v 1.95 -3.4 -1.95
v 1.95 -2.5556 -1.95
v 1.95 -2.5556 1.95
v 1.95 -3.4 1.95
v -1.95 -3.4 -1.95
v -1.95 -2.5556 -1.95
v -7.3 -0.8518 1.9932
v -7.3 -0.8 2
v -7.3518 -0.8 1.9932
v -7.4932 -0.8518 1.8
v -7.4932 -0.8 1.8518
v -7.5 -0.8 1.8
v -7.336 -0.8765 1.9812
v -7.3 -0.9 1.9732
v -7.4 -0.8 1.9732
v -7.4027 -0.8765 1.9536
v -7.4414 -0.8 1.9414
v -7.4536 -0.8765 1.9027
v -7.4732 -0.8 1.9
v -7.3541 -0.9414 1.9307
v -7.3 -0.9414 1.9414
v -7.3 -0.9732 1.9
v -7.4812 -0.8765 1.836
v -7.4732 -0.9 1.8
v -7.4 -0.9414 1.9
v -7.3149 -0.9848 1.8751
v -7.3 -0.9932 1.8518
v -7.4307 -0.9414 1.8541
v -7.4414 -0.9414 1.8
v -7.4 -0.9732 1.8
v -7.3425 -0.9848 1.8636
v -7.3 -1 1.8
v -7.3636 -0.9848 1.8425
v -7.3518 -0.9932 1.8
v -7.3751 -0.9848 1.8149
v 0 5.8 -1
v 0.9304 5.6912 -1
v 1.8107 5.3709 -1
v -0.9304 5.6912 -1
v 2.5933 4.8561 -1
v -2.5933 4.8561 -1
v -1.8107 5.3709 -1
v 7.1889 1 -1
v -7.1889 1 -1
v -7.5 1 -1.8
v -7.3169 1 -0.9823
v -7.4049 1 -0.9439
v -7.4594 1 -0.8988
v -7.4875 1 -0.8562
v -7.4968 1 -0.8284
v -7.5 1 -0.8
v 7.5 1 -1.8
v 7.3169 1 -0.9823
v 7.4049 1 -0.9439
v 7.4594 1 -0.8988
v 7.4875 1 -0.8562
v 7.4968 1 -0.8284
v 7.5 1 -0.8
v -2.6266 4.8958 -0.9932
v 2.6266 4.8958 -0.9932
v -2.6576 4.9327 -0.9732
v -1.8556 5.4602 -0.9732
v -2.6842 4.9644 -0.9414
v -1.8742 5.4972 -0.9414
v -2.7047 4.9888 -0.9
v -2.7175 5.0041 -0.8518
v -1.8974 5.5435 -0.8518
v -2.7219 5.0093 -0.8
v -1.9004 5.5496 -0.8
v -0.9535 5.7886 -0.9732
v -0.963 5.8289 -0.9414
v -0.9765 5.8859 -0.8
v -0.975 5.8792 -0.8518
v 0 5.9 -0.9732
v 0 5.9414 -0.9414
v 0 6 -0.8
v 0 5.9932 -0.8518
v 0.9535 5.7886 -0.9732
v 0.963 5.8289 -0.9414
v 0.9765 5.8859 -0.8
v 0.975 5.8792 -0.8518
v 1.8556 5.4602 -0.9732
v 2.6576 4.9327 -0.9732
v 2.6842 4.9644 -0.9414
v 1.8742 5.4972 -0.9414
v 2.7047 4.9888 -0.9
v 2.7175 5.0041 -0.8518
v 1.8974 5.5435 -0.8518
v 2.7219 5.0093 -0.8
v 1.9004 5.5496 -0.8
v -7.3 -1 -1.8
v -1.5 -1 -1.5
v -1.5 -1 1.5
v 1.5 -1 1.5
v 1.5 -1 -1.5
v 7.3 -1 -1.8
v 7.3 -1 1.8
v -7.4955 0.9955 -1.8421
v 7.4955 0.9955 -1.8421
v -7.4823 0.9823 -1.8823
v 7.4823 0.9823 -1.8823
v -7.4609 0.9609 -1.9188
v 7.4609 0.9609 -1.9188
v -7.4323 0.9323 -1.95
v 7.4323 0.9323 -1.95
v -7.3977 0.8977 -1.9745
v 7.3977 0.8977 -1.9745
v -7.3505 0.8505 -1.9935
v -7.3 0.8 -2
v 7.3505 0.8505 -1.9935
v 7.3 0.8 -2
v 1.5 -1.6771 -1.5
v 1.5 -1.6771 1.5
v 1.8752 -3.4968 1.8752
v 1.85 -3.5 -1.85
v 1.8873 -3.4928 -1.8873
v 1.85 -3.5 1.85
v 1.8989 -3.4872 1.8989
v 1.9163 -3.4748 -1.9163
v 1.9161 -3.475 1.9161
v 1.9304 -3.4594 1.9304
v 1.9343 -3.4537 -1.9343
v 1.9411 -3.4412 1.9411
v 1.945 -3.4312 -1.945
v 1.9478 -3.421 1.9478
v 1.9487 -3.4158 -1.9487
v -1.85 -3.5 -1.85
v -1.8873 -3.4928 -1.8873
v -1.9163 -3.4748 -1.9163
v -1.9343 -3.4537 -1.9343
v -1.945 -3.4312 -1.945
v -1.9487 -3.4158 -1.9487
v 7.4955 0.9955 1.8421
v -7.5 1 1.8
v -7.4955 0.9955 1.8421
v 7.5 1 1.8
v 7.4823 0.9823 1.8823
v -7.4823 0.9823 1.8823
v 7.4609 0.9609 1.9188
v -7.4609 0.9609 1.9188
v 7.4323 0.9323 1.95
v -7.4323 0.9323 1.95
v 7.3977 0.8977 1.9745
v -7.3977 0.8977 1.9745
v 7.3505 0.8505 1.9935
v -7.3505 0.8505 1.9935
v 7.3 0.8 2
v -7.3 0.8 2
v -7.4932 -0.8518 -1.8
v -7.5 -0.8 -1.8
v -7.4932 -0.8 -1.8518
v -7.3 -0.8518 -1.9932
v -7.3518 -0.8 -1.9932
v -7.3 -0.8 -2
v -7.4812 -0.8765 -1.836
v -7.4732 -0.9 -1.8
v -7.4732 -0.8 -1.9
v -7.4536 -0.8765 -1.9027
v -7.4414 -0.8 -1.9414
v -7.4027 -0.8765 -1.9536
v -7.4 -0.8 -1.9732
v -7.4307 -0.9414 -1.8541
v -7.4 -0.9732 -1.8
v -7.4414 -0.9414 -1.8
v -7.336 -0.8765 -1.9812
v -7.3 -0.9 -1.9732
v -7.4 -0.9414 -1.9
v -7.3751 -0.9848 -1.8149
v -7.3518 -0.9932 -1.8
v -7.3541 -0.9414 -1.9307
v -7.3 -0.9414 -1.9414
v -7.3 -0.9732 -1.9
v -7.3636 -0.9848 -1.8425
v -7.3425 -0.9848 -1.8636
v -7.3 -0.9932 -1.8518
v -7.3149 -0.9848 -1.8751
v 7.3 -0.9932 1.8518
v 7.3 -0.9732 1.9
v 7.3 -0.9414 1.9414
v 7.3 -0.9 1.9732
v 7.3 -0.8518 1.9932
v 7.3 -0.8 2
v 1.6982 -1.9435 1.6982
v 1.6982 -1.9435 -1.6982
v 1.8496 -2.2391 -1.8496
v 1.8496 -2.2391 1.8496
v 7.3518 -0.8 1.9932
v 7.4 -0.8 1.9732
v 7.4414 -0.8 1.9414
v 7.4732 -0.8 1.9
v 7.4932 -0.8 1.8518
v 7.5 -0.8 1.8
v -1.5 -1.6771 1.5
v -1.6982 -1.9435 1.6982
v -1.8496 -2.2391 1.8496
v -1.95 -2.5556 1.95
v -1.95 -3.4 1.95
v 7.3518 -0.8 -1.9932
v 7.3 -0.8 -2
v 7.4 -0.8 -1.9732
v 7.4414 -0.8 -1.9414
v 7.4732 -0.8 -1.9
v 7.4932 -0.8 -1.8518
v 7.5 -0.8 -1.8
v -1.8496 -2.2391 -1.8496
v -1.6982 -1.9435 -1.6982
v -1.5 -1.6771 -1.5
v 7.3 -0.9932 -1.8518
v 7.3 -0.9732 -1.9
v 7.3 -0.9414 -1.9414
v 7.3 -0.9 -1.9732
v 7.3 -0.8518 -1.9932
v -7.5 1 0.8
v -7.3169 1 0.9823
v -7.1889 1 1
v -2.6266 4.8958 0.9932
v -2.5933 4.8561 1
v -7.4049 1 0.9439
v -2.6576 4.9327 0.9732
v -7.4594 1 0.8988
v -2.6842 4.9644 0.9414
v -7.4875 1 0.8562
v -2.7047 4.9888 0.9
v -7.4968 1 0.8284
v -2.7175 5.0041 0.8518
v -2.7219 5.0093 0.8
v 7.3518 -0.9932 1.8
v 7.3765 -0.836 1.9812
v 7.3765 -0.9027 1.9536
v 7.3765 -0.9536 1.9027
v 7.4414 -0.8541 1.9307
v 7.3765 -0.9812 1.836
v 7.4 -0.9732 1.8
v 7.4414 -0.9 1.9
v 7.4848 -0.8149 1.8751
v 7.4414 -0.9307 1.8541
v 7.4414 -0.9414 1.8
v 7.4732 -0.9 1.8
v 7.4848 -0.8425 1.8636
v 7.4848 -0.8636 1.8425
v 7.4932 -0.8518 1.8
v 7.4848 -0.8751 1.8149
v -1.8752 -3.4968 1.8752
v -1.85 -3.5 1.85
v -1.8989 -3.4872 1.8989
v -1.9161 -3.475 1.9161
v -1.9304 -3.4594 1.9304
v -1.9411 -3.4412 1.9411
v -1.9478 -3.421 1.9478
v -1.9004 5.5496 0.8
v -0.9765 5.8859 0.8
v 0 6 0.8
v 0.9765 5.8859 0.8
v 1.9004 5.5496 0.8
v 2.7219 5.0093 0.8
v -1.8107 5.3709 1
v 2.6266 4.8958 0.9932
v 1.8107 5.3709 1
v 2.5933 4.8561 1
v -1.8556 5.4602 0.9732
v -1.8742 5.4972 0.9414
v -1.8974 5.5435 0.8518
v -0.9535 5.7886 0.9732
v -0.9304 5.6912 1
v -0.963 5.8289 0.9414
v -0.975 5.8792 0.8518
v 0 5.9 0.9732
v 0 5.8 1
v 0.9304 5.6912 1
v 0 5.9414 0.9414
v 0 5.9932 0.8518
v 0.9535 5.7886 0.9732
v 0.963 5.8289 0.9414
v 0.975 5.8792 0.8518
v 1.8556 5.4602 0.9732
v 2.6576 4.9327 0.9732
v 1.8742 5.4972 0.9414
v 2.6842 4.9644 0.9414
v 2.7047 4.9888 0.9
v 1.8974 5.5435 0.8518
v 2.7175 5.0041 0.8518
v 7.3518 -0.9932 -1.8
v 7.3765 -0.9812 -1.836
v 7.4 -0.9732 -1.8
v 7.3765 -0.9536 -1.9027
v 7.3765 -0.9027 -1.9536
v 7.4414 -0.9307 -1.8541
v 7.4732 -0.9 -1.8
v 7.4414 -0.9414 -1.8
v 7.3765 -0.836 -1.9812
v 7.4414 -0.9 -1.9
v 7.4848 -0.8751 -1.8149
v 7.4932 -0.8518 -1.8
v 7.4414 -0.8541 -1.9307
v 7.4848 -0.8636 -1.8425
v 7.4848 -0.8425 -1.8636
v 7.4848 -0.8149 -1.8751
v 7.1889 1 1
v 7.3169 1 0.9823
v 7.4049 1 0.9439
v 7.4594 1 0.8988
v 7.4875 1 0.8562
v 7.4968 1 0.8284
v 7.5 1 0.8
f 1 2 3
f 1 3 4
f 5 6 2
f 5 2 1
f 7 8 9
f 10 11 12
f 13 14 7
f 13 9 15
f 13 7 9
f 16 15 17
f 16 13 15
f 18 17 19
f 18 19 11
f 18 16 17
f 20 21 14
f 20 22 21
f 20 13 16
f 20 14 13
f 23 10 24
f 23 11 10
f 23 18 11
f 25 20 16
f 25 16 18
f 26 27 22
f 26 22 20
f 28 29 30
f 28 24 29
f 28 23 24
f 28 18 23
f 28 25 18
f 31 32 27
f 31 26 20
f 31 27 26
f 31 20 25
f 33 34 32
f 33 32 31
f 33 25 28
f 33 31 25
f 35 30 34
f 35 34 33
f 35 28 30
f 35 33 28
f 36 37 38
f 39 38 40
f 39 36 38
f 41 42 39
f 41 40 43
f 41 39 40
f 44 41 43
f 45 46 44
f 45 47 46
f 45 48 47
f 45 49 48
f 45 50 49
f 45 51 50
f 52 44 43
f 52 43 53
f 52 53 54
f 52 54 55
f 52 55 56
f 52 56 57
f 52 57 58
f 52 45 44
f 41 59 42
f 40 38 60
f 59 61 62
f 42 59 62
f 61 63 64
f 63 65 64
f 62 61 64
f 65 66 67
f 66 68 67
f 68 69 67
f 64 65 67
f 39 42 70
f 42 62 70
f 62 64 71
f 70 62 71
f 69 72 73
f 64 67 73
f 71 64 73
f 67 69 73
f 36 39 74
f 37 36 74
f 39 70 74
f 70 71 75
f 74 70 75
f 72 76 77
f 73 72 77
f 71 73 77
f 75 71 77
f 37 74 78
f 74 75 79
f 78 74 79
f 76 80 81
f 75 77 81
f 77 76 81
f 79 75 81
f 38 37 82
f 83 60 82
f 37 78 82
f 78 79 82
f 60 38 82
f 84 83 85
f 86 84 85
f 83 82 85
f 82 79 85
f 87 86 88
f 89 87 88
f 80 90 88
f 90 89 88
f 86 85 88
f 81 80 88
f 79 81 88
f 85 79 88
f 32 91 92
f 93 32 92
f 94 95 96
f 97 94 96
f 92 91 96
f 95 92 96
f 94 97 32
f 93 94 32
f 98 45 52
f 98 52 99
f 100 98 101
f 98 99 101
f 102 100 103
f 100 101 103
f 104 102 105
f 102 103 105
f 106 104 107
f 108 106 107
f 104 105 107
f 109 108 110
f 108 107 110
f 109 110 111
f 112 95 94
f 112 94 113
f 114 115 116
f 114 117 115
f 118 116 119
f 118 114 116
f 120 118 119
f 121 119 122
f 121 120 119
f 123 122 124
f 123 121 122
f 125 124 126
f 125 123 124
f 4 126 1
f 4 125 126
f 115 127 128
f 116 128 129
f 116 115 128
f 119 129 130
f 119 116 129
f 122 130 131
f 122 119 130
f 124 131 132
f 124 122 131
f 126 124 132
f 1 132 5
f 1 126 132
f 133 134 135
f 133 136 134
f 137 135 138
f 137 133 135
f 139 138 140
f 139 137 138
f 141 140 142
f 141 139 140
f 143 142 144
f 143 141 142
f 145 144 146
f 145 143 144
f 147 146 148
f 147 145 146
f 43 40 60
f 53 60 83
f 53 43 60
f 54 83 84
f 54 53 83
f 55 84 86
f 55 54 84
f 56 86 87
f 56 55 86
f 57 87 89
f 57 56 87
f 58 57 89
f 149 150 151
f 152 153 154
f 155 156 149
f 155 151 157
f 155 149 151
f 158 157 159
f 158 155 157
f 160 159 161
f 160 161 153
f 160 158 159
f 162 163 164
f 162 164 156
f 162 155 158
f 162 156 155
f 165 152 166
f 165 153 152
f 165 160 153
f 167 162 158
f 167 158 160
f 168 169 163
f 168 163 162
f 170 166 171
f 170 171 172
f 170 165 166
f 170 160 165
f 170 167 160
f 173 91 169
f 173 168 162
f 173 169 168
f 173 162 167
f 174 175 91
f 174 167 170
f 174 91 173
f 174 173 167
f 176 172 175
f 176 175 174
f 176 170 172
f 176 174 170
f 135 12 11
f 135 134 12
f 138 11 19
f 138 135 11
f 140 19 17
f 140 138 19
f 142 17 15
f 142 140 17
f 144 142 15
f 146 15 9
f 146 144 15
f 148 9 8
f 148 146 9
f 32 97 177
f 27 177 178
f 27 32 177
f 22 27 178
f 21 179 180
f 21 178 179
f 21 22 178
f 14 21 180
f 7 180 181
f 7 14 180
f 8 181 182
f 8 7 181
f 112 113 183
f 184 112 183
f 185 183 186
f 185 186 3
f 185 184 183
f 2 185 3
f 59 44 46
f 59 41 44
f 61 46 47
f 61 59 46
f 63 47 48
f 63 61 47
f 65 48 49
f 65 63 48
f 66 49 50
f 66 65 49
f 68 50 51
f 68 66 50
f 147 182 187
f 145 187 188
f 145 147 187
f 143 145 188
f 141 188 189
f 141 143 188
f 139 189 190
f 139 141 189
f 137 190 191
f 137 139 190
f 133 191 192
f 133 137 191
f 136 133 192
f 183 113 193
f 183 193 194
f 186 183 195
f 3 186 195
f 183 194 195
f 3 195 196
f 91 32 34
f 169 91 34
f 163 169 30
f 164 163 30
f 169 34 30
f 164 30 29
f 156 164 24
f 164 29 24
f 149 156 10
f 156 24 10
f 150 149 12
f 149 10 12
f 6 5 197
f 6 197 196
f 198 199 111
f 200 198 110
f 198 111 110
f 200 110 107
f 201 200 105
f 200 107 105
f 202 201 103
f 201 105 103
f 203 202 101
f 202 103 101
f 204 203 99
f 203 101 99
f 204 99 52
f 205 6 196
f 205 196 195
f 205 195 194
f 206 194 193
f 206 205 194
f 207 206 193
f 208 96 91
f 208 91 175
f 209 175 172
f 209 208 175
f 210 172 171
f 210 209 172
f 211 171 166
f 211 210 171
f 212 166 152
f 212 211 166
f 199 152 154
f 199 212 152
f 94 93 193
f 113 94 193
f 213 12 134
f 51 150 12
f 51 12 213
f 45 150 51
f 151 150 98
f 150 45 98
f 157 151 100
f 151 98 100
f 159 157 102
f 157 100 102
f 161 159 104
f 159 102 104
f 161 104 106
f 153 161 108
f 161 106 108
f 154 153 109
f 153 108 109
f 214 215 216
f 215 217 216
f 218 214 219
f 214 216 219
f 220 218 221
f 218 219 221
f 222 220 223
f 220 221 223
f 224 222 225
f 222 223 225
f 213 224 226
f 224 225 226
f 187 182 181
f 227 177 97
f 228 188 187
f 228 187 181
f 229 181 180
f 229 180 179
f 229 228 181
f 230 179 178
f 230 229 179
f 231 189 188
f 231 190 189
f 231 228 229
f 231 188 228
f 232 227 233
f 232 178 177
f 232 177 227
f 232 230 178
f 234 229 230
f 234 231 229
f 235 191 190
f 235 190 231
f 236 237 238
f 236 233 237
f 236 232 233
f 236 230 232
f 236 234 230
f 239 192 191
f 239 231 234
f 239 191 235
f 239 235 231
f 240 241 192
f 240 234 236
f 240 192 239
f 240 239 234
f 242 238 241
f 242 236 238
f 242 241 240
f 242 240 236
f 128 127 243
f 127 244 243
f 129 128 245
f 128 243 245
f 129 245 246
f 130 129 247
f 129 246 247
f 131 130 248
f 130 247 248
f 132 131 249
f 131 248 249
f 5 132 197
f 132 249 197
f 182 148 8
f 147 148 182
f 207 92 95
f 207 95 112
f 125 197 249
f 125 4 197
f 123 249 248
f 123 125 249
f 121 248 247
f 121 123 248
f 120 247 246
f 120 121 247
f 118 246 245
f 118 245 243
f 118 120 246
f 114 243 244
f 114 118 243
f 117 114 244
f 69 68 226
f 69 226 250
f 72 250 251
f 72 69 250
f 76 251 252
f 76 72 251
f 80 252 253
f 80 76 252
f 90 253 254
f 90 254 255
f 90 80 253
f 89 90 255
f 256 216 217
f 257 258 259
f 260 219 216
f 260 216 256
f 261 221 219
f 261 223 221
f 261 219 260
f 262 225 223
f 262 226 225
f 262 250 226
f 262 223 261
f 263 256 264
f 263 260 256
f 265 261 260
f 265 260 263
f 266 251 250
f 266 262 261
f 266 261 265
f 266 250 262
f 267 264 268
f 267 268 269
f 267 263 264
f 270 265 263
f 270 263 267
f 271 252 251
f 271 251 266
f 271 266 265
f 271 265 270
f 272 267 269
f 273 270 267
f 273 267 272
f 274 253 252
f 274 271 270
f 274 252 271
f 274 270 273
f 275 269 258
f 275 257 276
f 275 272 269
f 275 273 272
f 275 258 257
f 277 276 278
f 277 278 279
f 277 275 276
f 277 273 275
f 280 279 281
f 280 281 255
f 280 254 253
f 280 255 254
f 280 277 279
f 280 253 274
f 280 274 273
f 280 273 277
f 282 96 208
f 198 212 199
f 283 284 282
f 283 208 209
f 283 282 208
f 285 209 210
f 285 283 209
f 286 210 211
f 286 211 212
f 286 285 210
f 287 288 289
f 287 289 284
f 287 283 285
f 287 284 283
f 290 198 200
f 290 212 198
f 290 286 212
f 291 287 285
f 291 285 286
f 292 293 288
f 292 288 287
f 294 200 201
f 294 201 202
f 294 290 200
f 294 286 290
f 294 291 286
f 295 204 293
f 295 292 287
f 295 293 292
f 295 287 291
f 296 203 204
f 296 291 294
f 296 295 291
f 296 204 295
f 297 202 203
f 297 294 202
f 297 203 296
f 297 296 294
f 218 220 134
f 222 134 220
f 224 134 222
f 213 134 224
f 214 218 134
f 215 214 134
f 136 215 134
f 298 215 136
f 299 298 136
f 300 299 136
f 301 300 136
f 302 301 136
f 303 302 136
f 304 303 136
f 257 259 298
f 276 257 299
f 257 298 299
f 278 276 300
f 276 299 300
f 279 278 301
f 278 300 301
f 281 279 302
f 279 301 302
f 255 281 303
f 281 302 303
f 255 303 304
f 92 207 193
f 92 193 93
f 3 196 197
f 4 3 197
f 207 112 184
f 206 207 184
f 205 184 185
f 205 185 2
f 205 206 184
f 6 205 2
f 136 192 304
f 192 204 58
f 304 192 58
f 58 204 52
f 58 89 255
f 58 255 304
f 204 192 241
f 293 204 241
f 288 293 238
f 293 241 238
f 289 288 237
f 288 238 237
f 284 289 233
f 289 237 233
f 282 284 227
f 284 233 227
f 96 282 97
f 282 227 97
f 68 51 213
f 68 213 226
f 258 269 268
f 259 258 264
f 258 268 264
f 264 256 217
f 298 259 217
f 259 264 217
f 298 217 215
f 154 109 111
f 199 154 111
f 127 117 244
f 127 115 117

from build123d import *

# Parameters (mm, degrees)
EXTRUDE_1_DEPTH          = 2
EXTRUDE_1_DEPTH_BACK     = 2
SKETCH_1_W               = 15
SKETCH_1_H               = 2
EXTRUDE_2_DEPTH          = 2
EXTRUDE_2_DEPTH_BACK     = 2
CUT_EXTRUDE_1_DEPTH      = 2
CUT_EXTRUDE_1_DEPTH_BACK = 2
EXTRUDE_3_DEPTH          = 1
EXTRUDE_3_DEPTH_BACK     = 1
FILLET_2_R               = 0.2
FILLET_4_R               = 0.2
FILLET_5_R               = 0.2
FILLET_7_R               = 0.1


with BuildPart() as part:
    # 草图1 → 凸台-拉伸1 (new, two sides: drawn at the far end of the back side and taken through both)
    with BuildSketch(Plane.XY.offset(-EXTRUDE_1_DEPTH_BACK)):
        Rectangle(SKETCH_1_W, SKETCH_1_H)
    extrude(amount=EXTRUDE_1_DEPTH + EXTRUDE_1_DEPTH_BACK)

    # 草图2 → 凸台-拉伸2 (add, two sides: drawn at the far end of the back side and taken through both)
    with BuildSketch(Plane.XY.offset(-EXTRUDE_2_DEPTH_BACK)):
        with BuildLine():
            Line((-1.5, -1), (1.5, -1))
            Line((1.5, -1), (1.5, -1.677124344))
            ThreePointArc((1.5, -1.677124344), (1.780042303, -2.088161527), (1.95, -2.555590279))
            Line((1.95, -2.555590279), (1.95, -3.5))
            Line((1.95, -3.5), (-1.95, -3.5))
            Line((-1.95, -3.5), (-1.95, -2.555590279))
            ThreePointArc((-1.95, -2.555590279), (-1.780042303, -2.088161527), (-1.5, -1.677124344))
            Line((-1.5, -1.677124344), (-1.5, -1))
        make_face()
    extrude(amount=EXTRUDE_2_DEPTH + EXTRUDE_2_DEPTH_BACK)

    # 草图3 → 切除-拉伸1 (cut, two sides: drawn at the far end of the back side and taken through both)
    with BuildSketch(Plane(origin=(0, 0, 0), x_dir=(0, 0, -1), z_dir=(1, 0, 0)).offset(-CUT_EXTRUDE_1_DEPTH_BACK)):
        with BuildLine():
            Line((1.5, -1), (1.5, -1.677124344))
            ThreePointArc((1.5, -1.677124344), (1.780042303, -2.088161527), (1.95, -2.555590279))
            Line((1.95, -2.555590279), (1.95, -3.5))
            Line((1.95, -3.5), (2, -3.5))
            Line((2, -3.5), (2, -1))
            Line((2, -1), (1.5, -1))
        make_face()
        with BuildLine():
            Line((-2, -1), (-1.5, -1))
            Line((-1.5, -1), (-1.5, -1.677124344))
            ThreePointArc((-1.5, -1.677124344), (-1.780042303, -2.088161527), (-1.95, -2.555590279))
            Line((-1.95, -2.555590279), (-1.95, -3.5))
            Line((-1.95, -3.5), (-2, -3.5))
            Line((-2, -3.5), (-2, -1))
        make_face()
    extrude(amount=CUT_EXTRUDE_1_DEPTH + CUT_EXTRUDE_1_DEPTH_BACK, mode=Mode.SUBTRACT)

    # 草图4 → 凸台-拉伸3 (add, two sides: drawn at the far end of the back side and taken through both)
    with BuildSketch(Plane.XY.offset(-EXTRUDE_3_DEPTH_BACK)):
        with BuildLine():
            Line((7.5, 1), (-7.5, 1))
            Line((-7.5, 1), (-2.721884275, 5.009315143))
            ThreePointArc((-2.721884275, 5.009315143), (0, 6), (2.721884275, 5.009315143))
            Line((2.721884275, 5.009315143), (7.5, 1))
        make_face()
    extrude(amount=EXTRUDE_3_DEPTH + EXTRUDE_3_DEPTH_BACK)

    # 圆角2
    fillet_2_edges = [part.edges().sort_by_distance(p)[0] for p in [
        (0, 1, -2),
        (-7.5, 0, -2),
        (0, -1, -2),
        (7.5, 0, -2),
        (-7.5, 0, 2),
        (0, 1, 2),
        (7.5, 0, 2),
        (0, -1, 2),
    ]]
    fillet(fillet_2_edges, radius=FILLET_2_R)

    # 圆角4
    # the kernel refuses this fillet: 0.2 mm, written as the material it takes off along each edge
    with BuildSketch(Plane(origin=(7.3, -0.8, -1.8), x_dir=(0, -1, 0), z_dir=(1, 0, 0))) as fillet_4_piece_1_section:
        Polygon((0, 0), (FILLET_4_R, 0), (FILLET_4_R, FILLET_4_R), (0, FILLET_4_R), align=None)
    fillet_4_piece_1 = extrude(amount=FILLET_4_R, mode=Mode.PRIVATE)
    fillet_4_piece_1 = fillet_4_piece_1 - Plane(origin=(7.3, -0.8, -1.8), x_dir=(0, 0.7071067811865475, 0.7071067811865475), z_dir=(1, 0, 0)) * Sphere(FILLET_4_R, mode=Mode.PRIVATE)
    add(fillet_4_piece_1, mode=Mode.SUBTRACT)
    with BuildSketch(Plane(origin=(-7.3, -0.8, -1.8), x_dir=(-1, 0, 0), z_dir=(0, -1, 0))) as fillet_4_piece_2_section:
        Polygon((0, 0), (FILLET_4_R, 0), (FILLET_4_R, FILLET_4_R), (0, FILLET_4_R), align=None)
    fillet_4_piece_2 = extrude(amount=FILLET_4_R, mode=Mode.PRIVATE)
    fillet_4_piece_2 = fillet_4_piece_2 - Plane(origin=(-7.3, -0.8, -1.8), x_dir=(0.7071067811865475, 0, 0.7071067811865475), z_dir=(0, -1, 0)) * Sphere(FILLET_4_R, mode=Mode.PRIVATE)
    add(fillet_4_piece_2, mode=Mode.SUBTRACT)
    with BuildSketch(Plane(origin=(7.3, -0.8, 1.8), x_dir=(0, -1, 0), z_dir=(1, 0, 0))) as fillet_4_piece_3_section:
        Polygon((0, 0), (FILLET_4_R, 0), (FILLET_4_R, -FILLET_4_R), (0, -FILLET_4_R), align=None)
    fillet_4_piece_3 = extrude(amount=FILLET_4_R, mode=Mode.PRIVATE)
    fillet_4_piece_3 = fillet_4_piece_3 - Plane(origin=(7.3, -0.8, 1.8), x_dir=(0, 0.7071067811865475, -0.7071067811865475), z_dir=(1, 0, 0)) * Sphere(FILLET_4_R, mode=Mode.PRIVATE)
    add(fillet_4_piece_3, mode=Mode.SUBTRACT)
    with BuildSketch(Plane(origin=(-7.3, -0.8, 1.8), x_dir=(-1, 0, 0), z_dir=(0, -1, 0))) as fillet_4_piece_4_section:
        Polygon((0, 0), (FILLET_4_R, 0), (FILLET_4_R, -FILLET_4_R), (0, -FILLET_4_R), align=None)
    fillet_4_piece_4 = extrude(amount=FILLET_4_R, mode=Mode.PRIVATE)
    fillet_4_piece_4 = fillet_4_piece_4 - Plane(origin=(-7.3, -0.8, 1.8), x_dir=(0.7071067811865475, 0, -0.7071067811865475), z_dir=(0, -1, 0)) * Sphere(FILLET_4_R, mode=Mode.PRIVATE)
    add(fillet_4_piece_4, mode=Mode.SUBTRACT)
    with BuildSketch(Plane(origin=(-7.5, -1, 1.8), x_dir=(1, 0, 0), z_dir=(0, 0, -1)), Plane(origin=(7.5, -1, 1.8), x_dir=(0, 1, 0), z_dir=(0, 0, -1))) as fillet_4_piece_5:
        with BuildLine():
            CenterArc((FILLET_4_R, -FILLET_4_R), FILLET_4_R, 90, 90)
            Line((0, -FILLET_4_R), (0, 0))
            Line((0, 0), (FILLET_4_R, 0))
        make_face()
    extrude(amount=3.6, mode=Mode.SUBTRACT)

    # 圆角5
    fillet_5_edges = [part.edges().sort_by_distance(p)[0] for p in [
        (5.110942137, 3.004657571, -1),
        (0, 6, -1),
        (5.110942137, 3.004657571, 1),
        (0, 6, 1),
        (-5.110942137, 3.004657571, -1),
        (-5.110942137, 3.004657571, 1),
    ]]
    fillet(fillet_5_edges, radius=FILLET_5_R)

    # 圆角7
    fillet_7_edges = [part.edges().sort_by_distance(p)[0] for p in [
        (0, -3.5, 1.95),
        (1.95, -3.5, 0),
        (-1.95, -3.5, 0),
        (0, -3.5, -1.95),
    ]]
    fillet(fillet_7_edges, radius=FILLET_7_R)


solid = part.part
